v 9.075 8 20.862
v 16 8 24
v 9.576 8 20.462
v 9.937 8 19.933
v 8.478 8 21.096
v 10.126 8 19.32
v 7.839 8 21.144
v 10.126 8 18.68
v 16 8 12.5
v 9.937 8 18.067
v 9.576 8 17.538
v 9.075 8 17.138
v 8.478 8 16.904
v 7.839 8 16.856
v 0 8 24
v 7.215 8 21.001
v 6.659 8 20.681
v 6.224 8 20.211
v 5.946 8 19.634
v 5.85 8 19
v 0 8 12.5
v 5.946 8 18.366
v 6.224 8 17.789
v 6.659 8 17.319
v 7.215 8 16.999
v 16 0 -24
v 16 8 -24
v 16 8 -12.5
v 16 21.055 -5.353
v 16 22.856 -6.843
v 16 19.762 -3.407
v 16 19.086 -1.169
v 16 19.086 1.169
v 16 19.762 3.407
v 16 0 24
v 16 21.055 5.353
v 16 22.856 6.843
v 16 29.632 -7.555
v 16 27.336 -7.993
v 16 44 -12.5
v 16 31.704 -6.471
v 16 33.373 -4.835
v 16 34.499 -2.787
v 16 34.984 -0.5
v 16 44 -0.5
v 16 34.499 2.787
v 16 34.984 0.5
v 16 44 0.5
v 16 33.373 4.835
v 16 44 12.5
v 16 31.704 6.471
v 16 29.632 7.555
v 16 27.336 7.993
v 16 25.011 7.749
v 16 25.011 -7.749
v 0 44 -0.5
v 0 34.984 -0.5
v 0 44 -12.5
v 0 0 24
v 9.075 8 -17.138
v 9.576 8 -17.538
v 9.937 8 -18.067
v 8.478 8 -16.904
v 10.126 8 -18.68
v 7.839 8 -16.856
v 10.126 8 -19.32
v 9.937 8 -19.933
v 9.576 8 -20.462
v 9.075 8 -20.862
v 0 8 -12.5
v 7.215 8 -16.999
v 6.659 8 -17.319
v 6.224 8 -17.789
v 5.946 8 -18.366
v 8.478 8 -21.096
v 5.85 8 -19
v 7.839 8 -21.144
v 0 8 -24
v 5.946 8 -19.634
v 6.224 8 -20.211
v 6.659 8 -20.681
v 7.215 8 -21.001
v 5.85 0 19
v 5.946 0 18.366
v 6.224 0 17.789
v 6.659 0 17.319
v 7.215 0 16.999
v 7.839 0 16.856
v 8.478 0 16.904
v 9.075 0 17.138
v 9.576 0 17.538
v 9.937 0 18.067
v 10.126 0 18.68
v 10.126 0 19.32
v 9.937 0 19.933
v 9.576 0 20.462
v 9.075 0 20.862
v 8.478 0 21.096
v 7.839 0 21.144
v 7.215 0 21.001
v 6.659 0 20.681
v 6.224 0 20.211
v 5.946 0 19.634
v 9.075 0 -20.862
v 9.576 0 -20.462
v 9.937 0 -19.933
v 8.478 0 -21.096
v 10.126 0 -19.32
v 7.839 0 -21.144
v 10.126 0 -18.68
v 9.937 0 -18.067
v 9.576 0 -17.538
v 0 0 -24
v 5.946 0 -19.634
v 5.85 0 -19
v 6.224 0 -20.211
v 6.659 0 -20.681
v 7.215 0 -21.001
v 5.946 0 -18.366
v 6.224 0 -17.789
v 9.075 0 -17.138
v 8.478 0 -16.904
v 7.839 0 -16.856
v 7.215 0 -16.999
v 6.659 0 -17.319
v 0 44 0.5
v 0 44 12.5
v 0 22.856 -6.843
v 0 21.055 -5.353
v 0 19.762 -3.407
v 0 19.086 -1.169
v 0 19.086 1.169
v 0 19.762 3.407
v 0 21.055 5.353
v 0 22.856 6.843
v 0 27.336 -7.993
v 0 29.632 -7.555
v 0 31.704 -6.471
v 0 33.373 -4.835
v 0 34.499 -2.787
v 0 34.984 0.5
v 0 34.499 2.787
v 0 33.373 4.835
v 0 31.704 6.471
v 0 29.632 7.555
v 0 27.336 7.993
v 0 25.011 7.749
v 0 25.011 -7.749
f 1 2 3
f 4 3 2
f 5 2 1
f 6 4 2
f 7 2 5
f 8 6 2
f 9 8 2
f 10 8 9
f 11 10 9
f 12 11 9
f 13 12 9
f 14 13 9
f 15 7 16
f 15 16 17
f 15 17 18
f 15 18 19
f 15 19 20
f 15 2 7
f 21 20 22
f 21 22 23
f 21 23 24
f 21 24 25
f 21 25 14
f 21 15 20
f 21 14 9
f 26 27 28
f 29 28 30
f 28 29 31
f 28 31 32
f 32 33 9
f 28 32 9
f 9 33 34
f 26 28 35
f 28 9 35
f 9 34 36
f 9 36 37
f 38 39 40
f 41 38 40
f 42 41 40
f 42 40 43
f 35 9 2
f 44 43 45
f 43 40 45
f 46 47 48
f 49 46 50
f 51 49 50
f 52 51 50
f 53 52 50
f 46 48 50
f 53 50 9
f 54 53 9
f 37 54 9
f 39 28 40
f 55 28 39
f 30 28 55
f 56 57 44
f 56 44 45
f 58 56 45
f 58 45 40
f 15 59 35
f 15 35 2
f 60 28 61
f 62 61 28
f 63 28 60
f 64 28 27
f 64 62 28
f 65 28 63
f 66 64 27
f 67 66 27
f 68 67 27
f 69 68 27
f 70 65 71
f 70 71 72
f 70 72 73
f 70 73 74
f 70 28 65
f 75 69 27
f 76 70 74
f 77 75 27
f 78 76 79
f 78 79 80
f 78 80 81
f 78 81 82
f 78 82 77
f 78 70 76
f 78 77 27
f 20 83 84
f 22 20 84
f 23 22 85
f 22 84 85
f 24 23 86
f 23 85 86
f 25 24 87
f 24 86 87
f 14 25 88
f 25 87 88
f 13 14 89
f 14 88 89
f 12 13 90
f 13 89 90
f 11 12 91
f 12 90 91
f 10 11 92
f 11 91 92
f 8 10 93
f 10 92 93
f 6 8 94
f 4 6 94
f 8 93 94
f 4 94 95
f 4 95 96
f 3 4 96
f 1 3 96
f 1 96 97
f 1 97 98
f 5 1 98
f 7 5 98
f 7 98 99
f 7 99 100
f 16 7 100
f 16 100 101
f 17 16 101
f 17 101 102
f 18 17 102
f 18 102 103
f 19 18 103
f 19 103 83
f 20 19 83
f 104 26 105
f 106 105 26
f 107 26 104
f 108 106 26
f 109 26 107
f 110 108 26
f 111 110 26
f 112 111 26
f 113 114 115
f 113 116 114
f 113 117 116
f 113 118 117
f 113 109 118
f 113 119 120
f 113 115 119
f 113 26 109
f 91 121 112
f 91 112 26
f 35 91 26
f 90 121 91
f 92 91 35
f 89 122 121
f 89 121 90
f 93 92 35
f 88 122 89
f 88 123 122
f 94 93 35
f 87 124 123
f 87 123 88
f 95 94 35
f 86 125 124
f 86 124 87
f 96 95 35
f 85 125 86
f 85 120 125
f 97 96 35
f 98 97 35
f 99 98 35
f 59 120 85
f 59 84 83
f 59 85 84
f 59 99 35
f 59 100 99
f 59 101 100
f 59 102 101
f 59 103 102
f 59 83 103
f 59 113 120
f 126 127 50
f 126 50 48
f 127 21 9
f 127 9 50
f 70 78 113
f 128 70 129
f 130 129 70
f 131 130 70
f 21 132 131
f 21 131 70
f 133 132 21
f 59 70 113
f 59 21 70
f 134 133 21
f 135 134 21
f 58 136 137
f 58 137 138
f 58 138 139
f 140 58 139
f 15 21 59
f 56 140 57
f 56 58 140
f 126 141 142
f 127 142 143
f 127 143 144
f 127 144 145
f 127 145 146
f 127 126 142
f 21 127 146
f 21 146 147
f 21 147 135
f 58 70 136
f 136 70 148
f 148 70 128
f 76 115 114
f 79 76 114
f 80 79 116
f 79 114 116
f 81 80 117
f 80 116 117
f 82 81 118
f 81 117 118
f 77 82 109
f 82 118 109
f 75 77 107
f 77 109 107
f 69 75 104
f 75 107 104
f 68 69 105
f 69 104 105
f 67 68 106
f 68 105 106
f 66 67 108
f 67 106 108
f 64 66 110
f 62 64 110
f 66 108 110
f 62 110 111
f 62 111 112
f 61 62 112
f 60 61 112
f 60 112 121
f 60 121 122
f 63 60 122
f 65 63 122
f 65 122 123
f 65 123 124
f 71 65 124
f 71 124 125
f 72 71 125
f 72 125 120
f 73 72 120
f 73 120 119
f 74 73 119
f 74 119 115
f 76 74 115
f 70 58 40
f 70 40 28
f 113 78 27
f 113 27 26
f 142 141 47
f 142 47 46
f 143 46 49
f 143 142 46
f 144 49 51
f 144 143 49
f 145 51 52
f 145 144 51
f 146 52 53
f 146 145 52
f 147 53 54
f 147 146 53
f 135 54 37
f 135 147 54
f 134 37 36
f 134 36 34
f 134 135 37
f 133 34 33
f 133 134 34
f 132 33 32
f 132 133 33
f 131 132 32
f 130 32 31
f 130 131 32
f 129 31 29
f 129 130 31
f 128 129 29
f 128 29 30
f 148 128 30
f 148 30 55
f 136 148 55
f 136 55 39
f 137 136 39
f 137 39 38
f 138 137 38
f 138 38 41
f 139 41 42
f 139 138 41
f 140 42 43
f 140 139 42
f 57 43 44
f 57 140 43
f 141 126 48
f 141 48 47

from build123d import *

# Parameters (mm, degrees)
BOSS_EXTRUDE1_DEPTH  = 16
M4_CLEARANCE_HOLE2_D = 4.3


with BuildPart() as part:
    # Sketch1 → Boss-Extrude1 (new body)
    with BuildSketch(Plane(origin=(0, 0, 0), x_dir=(0, 0, -1), z_dir=(1, 0, 0))):
        with BuildLine():
            Line((12.5, 8), (24, 8))
            Line((24, 8), (24, 0))
            Line((24, 0), (-24, 0))
            Line((-24, 0), (-24, 8))
            Line((-24, 8), (-12.5, 8))
            Line((-12.5, 8), (-12.5, 44))
            Line((-12.5, 44), (-0.5, 44))
            Line((-0.5, 44), (-0.5, 34.984359711))
            ThreePointArc((-0.5, 34.984359711), (0, 19), (0.5, 34.984359711))
            Line((0.5, 34.984359711), (0.5, 44))
            Line((0.5, 44), (12.5, 44))
            Line((12.5, 44), (12.5, 8))
        make_face()
    extrude(amount=BOSS_EXTRUDE1_DEPTH)

    # M4 Clearance Hole2 (through all)
    with Locations(Plane(origin=(0, 8, 0), x_dir=(1, 0, 0), z_dir=(0, 1, 0))):
        with Locations((8, 19), (8, -19)):
            Hole(M4_CLEARANCE_HOLE2_D / 2)


solid = part.part
